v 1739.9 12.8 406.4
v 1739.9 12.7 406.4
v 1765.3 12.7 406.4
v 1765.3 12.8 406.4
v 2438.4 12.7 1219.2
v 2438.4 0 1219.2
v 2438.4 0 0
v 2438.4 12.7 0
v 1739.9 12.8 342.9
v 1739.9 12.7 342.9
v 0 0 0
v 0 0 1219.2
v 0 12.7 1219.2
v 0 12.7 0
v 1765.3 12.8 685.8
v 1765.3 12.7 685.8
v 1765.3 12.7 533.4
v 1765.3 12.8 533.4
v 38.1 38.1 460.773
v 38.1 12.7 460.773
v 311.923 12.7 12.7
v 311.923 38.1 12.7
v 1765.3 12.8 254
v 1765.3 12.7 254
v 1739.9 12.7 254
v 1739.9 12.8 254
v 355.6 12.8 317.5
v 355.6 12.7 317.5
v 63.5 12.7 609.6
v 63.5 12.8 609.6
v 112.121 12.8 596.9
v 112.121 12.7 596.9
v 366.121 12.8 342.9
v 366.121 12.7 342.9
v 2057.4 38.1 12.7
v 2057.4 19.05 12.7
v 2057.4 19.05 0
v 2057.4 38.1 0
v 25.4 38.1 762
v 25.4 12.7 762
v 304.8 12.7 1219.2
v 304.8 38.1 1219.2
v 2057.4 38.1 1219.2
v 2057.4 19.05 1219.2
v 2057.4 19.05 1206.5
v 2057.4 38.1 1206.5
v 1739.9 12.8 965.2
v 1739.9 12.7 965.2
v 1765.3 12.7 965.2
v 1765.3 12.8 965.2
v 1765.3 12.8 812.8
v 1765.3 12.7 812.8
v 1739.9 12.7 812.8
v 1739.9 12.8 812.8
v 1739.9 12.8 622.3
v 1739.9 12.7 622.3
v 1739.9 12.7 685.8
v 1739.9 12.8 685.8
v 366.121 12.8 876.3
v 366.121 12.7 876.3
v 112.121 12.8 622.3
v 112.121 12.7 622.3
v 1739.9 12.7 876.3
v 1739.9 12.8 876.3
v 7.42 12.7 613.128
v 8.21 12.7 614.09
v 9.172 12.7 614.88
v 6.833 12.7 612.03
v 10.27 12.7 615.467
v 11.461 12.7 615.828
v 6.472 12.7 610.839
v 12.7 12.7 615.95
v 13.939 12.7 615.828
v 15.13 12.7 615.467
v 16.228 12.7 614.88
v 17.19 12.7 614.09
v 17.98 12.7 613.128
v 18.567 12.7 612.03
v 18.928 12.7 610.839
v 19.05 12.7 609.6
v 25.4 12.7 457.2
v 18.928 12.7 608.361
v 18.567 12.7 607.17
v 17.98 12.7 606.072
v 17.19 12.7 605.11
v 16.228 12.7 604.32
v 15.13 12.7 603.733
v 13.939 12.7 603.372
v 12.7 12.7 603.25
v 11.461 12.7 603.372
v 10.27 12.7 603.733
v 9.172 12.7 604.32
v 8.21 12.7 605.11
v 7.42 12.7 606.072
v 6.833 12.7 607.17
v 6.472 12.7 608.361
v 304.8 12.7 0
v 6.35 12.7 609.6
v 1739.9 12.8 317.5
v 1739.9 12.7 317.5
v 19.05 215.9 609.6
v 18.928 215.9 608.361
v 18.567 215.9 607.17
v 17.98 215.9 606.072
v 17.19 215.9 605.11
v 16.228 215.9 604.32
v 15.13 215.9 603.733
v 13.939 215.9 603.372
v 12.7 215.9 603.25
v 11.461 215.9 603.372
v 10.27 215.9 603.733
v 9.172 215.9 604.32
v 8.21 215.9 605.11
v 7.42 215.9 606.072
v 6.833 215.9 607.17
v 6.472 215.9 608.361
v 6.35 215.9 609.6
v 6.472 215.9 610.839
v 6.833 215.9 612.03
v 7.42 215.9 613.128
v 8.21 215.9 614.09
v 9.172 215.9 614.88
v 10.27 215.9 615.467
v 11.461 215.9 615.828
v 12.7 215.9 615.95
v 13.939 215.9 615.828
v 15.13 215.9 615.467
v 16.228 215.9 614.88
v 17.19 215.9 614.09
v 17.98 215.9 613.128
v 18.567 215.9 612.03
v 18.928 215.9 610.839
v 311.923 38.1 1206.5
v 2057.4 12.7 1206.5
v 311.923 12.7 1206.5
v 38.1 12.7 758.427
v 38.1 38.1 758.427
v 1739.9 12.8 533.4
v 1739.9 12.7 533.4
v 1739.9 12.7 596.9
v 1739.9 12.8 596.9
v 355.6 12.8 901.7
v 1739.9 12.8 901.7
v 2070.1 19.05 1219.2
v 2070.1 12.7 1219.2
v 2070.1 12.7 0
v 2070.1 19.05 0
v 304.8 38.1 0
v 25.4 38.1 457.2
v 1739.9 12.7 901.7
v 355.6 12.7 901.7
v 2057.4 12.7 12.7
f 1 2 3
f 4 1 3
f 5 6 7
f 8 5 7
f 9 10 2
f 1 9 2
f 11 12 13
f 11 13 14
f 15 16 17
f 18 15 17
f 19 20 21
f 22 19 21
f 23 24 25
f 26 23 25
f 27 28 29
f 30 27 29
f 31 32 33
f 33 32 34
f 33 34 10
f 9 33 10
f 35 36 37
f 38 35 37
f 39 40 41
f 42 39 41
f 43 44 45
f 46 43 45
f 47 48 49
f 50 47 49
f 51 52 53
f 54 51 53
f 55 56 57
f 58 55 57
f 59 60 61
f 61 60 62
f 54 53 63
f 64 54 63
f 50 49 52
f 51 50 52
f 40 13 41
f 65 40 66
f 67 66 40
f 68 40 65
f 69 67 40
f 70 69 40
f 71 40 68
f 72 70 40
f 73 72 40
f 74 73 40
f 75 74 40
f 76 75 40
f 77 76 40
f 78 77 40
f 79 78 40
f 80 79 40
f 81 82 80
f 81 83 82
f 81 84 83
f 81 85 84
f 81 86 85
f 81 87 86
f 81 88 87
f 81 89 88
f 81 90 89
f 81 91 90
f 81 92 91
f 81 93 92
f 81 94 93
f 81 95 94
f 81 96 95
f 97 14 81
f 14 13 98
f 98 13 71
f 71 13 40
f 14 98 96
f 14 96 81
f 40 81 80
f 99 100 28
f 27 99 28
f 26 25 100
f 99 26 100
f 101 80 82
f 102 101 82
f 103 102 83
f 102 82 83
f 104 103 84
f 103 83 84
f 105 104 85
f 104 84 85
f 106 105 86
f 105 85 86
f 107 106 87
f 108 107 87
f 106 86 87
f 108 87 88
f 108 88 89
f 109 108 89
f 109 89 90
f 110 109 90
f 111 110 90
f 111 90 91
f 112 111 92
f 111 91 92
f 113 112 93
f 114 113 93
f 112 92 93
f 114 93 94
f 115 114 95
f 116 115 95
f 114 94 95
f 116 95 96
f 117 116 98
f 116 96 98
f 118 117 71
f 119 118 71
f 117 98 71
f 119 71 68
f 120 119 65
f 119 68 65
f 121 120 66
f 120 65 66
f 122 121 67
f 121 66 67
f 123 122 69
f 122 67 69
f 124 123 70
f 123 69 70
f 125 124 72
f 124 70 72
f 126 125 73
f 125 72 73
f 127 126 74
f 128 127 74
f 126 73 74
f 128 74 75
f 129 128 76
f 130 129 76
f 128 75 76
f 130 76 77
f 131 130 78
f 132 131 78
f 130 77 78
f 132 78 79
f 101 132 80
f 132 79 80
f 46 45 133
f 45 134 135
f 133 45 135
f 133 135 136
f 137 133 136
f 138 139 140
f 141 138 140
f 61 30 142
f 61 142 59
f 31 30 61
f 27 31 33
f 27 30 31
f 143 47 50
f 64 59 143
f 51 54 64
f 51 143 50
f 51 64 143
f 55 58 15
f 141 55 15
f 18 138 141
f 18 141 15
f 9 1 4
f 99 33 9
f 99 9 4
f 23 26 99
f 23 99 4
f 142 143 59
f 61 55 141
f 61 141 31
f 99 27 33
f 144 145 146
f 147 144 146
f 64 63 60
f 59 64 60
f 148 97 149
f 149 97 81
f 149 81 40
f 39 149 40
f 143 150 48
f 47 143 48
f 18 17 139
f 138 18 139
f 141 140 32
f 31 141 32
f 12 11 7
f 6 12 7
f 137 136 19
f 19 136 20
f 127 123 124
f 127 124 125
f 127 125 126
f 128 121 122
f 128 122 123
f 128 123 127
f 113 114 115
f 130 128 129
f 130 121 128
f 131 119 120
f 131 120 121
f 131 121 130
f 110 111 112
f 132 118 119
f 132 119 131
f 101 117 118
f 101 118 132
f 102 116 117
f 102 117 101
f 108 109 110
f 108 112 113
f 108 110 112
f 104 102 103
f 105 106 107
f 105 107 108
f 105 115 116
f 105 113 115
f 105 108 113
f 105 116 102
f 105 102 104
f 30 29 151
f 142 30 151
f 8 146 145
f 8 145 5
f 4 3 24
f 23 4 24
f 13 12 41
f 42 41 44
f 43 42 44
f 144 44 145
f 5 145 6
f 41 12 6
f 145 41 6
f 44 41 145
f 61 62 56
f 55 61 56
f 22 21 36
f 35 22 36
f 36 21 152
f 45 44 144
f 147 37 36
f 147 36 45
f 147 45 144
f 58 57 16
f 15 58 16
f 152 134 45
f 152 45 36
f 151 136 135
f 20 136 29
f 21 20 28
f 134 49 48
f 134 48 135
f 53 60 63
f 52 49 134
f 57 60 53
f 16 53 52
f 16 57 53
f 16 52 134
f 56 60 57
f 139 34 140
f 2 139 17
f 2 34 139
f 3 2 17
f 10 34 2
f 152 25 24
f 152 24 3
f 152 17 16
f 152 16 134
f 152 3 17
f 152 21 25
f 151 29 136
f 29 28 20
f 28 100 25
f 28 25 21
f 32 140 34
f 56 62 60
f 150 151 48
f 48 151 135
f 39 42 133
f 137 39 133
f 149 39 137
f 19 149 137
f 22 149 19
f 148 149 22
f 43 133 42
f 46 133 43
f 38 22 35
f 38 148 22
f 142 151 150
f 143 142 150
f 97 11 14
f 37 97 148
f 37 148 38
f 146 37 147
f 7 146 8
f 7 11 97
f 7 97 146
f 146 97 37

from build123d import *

# Parameters (mm, degrees)
SKETCH1_W             = 2438.4
SKETCH1_H             = 1219.2
BASE_DEPTH            = 12.7
OUTSIDE_WALLS_DEPTH   = 25.4
SKETCH3_W             = 12.7
SKETCH3_H             = 1219.2
FRONT_WALL_DEPTH      = 6.35
TAPE_DEPTH            = 0.1
SKETCH5_R             = 6.35
F_10KHZ_EMITTER_DEPTH = 203.2


with BuildPart() as part:
    # Sketch1 → Base (new body)
    with BuildSketch(Plane(origin=(0, 0, 0), x_dir=(1, 0, 0), z_dir=(0, 1, 0))):
        with Locations((1219.2, -609.6)):
            Rectangle(SKETCH1_W, SKETCH1_H)
    extrude(amount=BASE_DEPTH)

    # Sketch2 → Outside Walls (add)
    with BuildSketch(Plane(origin=(0, 12.7, 0), x_dir=(1, 0, 0), z_dir=(0, 1, 0))):
        Polygon((304.8, 0), (25.4, -457.2), (25.4, -762), (304.8, -1219.2), (2057.4, -1219.2), (2057.4, -1206.5), (311.922599639, -1206.5), (38.1, -758.426655137), (38.1, -460.773344863), (311.922599639, -12.7), (2057.4, -12.7), (2057.4, 0), align=None)
    extrude(amount=OUTSIDE_WALLS_DEPTH)

    # Sketch3 → Front Wall (add)
    with BuildSketch(Plane(origin=(0, 12.7, 0), x_dir=(1, 0, 0), z_dir=(0, 1, 0))):
        with Locations((2063.75, -609.6)):
            Rectangle(SKETCH3_W, SKETCH3_H)
    extrude(amount=FRONT_WALL_DEPTH)

    # Sketch4 → Tape (add)
    with BuildSketch(Plane(origin=(0, 12.7, 0), x_dir=(1, 0, 0), z_dir=(0, 1, 0))):
        Polygon((63.5, -609.6), (355.6, -901.7), (1739.9, -901.7), (1739.9, -965.2), (1765.3, -965.2), (1765.3, -812.8), (1739.9, -812.8), (1739.9, -876.3), (366.121024484, -876.3), (112.121024484, -622.3), (1739.9, -622.3), (1739.9, -685.8), (1765.3, -685.8), (1765.3, -533.4), (1739.9, -533.4), (1739.9, -596.9), (112.121024484, -596.9), (366.121024484, -342.9), (1739.9, -342.9), (1739.9, -406.4), (1765.3, -406.4), (1765.3, -254), (1739.9, -254), (1739.9, -317.5), (355.6, -317.5), align=None)
    extrude(amount=TAPE_DEPTH)

    # Sketch5 → 10kHz Emitter (add)
    with BuildSketch(Plane(origin=(0, 12.7, 0), x_dir=(1, 0, 0), z_dir=(0, 1, 0))):
        with Locations((12.7, -609.6)):
            Circle(SKETCH5_R)
    extrude(amount=F_10KHZ_EMITTER_DEPTH)


solid = part.part
